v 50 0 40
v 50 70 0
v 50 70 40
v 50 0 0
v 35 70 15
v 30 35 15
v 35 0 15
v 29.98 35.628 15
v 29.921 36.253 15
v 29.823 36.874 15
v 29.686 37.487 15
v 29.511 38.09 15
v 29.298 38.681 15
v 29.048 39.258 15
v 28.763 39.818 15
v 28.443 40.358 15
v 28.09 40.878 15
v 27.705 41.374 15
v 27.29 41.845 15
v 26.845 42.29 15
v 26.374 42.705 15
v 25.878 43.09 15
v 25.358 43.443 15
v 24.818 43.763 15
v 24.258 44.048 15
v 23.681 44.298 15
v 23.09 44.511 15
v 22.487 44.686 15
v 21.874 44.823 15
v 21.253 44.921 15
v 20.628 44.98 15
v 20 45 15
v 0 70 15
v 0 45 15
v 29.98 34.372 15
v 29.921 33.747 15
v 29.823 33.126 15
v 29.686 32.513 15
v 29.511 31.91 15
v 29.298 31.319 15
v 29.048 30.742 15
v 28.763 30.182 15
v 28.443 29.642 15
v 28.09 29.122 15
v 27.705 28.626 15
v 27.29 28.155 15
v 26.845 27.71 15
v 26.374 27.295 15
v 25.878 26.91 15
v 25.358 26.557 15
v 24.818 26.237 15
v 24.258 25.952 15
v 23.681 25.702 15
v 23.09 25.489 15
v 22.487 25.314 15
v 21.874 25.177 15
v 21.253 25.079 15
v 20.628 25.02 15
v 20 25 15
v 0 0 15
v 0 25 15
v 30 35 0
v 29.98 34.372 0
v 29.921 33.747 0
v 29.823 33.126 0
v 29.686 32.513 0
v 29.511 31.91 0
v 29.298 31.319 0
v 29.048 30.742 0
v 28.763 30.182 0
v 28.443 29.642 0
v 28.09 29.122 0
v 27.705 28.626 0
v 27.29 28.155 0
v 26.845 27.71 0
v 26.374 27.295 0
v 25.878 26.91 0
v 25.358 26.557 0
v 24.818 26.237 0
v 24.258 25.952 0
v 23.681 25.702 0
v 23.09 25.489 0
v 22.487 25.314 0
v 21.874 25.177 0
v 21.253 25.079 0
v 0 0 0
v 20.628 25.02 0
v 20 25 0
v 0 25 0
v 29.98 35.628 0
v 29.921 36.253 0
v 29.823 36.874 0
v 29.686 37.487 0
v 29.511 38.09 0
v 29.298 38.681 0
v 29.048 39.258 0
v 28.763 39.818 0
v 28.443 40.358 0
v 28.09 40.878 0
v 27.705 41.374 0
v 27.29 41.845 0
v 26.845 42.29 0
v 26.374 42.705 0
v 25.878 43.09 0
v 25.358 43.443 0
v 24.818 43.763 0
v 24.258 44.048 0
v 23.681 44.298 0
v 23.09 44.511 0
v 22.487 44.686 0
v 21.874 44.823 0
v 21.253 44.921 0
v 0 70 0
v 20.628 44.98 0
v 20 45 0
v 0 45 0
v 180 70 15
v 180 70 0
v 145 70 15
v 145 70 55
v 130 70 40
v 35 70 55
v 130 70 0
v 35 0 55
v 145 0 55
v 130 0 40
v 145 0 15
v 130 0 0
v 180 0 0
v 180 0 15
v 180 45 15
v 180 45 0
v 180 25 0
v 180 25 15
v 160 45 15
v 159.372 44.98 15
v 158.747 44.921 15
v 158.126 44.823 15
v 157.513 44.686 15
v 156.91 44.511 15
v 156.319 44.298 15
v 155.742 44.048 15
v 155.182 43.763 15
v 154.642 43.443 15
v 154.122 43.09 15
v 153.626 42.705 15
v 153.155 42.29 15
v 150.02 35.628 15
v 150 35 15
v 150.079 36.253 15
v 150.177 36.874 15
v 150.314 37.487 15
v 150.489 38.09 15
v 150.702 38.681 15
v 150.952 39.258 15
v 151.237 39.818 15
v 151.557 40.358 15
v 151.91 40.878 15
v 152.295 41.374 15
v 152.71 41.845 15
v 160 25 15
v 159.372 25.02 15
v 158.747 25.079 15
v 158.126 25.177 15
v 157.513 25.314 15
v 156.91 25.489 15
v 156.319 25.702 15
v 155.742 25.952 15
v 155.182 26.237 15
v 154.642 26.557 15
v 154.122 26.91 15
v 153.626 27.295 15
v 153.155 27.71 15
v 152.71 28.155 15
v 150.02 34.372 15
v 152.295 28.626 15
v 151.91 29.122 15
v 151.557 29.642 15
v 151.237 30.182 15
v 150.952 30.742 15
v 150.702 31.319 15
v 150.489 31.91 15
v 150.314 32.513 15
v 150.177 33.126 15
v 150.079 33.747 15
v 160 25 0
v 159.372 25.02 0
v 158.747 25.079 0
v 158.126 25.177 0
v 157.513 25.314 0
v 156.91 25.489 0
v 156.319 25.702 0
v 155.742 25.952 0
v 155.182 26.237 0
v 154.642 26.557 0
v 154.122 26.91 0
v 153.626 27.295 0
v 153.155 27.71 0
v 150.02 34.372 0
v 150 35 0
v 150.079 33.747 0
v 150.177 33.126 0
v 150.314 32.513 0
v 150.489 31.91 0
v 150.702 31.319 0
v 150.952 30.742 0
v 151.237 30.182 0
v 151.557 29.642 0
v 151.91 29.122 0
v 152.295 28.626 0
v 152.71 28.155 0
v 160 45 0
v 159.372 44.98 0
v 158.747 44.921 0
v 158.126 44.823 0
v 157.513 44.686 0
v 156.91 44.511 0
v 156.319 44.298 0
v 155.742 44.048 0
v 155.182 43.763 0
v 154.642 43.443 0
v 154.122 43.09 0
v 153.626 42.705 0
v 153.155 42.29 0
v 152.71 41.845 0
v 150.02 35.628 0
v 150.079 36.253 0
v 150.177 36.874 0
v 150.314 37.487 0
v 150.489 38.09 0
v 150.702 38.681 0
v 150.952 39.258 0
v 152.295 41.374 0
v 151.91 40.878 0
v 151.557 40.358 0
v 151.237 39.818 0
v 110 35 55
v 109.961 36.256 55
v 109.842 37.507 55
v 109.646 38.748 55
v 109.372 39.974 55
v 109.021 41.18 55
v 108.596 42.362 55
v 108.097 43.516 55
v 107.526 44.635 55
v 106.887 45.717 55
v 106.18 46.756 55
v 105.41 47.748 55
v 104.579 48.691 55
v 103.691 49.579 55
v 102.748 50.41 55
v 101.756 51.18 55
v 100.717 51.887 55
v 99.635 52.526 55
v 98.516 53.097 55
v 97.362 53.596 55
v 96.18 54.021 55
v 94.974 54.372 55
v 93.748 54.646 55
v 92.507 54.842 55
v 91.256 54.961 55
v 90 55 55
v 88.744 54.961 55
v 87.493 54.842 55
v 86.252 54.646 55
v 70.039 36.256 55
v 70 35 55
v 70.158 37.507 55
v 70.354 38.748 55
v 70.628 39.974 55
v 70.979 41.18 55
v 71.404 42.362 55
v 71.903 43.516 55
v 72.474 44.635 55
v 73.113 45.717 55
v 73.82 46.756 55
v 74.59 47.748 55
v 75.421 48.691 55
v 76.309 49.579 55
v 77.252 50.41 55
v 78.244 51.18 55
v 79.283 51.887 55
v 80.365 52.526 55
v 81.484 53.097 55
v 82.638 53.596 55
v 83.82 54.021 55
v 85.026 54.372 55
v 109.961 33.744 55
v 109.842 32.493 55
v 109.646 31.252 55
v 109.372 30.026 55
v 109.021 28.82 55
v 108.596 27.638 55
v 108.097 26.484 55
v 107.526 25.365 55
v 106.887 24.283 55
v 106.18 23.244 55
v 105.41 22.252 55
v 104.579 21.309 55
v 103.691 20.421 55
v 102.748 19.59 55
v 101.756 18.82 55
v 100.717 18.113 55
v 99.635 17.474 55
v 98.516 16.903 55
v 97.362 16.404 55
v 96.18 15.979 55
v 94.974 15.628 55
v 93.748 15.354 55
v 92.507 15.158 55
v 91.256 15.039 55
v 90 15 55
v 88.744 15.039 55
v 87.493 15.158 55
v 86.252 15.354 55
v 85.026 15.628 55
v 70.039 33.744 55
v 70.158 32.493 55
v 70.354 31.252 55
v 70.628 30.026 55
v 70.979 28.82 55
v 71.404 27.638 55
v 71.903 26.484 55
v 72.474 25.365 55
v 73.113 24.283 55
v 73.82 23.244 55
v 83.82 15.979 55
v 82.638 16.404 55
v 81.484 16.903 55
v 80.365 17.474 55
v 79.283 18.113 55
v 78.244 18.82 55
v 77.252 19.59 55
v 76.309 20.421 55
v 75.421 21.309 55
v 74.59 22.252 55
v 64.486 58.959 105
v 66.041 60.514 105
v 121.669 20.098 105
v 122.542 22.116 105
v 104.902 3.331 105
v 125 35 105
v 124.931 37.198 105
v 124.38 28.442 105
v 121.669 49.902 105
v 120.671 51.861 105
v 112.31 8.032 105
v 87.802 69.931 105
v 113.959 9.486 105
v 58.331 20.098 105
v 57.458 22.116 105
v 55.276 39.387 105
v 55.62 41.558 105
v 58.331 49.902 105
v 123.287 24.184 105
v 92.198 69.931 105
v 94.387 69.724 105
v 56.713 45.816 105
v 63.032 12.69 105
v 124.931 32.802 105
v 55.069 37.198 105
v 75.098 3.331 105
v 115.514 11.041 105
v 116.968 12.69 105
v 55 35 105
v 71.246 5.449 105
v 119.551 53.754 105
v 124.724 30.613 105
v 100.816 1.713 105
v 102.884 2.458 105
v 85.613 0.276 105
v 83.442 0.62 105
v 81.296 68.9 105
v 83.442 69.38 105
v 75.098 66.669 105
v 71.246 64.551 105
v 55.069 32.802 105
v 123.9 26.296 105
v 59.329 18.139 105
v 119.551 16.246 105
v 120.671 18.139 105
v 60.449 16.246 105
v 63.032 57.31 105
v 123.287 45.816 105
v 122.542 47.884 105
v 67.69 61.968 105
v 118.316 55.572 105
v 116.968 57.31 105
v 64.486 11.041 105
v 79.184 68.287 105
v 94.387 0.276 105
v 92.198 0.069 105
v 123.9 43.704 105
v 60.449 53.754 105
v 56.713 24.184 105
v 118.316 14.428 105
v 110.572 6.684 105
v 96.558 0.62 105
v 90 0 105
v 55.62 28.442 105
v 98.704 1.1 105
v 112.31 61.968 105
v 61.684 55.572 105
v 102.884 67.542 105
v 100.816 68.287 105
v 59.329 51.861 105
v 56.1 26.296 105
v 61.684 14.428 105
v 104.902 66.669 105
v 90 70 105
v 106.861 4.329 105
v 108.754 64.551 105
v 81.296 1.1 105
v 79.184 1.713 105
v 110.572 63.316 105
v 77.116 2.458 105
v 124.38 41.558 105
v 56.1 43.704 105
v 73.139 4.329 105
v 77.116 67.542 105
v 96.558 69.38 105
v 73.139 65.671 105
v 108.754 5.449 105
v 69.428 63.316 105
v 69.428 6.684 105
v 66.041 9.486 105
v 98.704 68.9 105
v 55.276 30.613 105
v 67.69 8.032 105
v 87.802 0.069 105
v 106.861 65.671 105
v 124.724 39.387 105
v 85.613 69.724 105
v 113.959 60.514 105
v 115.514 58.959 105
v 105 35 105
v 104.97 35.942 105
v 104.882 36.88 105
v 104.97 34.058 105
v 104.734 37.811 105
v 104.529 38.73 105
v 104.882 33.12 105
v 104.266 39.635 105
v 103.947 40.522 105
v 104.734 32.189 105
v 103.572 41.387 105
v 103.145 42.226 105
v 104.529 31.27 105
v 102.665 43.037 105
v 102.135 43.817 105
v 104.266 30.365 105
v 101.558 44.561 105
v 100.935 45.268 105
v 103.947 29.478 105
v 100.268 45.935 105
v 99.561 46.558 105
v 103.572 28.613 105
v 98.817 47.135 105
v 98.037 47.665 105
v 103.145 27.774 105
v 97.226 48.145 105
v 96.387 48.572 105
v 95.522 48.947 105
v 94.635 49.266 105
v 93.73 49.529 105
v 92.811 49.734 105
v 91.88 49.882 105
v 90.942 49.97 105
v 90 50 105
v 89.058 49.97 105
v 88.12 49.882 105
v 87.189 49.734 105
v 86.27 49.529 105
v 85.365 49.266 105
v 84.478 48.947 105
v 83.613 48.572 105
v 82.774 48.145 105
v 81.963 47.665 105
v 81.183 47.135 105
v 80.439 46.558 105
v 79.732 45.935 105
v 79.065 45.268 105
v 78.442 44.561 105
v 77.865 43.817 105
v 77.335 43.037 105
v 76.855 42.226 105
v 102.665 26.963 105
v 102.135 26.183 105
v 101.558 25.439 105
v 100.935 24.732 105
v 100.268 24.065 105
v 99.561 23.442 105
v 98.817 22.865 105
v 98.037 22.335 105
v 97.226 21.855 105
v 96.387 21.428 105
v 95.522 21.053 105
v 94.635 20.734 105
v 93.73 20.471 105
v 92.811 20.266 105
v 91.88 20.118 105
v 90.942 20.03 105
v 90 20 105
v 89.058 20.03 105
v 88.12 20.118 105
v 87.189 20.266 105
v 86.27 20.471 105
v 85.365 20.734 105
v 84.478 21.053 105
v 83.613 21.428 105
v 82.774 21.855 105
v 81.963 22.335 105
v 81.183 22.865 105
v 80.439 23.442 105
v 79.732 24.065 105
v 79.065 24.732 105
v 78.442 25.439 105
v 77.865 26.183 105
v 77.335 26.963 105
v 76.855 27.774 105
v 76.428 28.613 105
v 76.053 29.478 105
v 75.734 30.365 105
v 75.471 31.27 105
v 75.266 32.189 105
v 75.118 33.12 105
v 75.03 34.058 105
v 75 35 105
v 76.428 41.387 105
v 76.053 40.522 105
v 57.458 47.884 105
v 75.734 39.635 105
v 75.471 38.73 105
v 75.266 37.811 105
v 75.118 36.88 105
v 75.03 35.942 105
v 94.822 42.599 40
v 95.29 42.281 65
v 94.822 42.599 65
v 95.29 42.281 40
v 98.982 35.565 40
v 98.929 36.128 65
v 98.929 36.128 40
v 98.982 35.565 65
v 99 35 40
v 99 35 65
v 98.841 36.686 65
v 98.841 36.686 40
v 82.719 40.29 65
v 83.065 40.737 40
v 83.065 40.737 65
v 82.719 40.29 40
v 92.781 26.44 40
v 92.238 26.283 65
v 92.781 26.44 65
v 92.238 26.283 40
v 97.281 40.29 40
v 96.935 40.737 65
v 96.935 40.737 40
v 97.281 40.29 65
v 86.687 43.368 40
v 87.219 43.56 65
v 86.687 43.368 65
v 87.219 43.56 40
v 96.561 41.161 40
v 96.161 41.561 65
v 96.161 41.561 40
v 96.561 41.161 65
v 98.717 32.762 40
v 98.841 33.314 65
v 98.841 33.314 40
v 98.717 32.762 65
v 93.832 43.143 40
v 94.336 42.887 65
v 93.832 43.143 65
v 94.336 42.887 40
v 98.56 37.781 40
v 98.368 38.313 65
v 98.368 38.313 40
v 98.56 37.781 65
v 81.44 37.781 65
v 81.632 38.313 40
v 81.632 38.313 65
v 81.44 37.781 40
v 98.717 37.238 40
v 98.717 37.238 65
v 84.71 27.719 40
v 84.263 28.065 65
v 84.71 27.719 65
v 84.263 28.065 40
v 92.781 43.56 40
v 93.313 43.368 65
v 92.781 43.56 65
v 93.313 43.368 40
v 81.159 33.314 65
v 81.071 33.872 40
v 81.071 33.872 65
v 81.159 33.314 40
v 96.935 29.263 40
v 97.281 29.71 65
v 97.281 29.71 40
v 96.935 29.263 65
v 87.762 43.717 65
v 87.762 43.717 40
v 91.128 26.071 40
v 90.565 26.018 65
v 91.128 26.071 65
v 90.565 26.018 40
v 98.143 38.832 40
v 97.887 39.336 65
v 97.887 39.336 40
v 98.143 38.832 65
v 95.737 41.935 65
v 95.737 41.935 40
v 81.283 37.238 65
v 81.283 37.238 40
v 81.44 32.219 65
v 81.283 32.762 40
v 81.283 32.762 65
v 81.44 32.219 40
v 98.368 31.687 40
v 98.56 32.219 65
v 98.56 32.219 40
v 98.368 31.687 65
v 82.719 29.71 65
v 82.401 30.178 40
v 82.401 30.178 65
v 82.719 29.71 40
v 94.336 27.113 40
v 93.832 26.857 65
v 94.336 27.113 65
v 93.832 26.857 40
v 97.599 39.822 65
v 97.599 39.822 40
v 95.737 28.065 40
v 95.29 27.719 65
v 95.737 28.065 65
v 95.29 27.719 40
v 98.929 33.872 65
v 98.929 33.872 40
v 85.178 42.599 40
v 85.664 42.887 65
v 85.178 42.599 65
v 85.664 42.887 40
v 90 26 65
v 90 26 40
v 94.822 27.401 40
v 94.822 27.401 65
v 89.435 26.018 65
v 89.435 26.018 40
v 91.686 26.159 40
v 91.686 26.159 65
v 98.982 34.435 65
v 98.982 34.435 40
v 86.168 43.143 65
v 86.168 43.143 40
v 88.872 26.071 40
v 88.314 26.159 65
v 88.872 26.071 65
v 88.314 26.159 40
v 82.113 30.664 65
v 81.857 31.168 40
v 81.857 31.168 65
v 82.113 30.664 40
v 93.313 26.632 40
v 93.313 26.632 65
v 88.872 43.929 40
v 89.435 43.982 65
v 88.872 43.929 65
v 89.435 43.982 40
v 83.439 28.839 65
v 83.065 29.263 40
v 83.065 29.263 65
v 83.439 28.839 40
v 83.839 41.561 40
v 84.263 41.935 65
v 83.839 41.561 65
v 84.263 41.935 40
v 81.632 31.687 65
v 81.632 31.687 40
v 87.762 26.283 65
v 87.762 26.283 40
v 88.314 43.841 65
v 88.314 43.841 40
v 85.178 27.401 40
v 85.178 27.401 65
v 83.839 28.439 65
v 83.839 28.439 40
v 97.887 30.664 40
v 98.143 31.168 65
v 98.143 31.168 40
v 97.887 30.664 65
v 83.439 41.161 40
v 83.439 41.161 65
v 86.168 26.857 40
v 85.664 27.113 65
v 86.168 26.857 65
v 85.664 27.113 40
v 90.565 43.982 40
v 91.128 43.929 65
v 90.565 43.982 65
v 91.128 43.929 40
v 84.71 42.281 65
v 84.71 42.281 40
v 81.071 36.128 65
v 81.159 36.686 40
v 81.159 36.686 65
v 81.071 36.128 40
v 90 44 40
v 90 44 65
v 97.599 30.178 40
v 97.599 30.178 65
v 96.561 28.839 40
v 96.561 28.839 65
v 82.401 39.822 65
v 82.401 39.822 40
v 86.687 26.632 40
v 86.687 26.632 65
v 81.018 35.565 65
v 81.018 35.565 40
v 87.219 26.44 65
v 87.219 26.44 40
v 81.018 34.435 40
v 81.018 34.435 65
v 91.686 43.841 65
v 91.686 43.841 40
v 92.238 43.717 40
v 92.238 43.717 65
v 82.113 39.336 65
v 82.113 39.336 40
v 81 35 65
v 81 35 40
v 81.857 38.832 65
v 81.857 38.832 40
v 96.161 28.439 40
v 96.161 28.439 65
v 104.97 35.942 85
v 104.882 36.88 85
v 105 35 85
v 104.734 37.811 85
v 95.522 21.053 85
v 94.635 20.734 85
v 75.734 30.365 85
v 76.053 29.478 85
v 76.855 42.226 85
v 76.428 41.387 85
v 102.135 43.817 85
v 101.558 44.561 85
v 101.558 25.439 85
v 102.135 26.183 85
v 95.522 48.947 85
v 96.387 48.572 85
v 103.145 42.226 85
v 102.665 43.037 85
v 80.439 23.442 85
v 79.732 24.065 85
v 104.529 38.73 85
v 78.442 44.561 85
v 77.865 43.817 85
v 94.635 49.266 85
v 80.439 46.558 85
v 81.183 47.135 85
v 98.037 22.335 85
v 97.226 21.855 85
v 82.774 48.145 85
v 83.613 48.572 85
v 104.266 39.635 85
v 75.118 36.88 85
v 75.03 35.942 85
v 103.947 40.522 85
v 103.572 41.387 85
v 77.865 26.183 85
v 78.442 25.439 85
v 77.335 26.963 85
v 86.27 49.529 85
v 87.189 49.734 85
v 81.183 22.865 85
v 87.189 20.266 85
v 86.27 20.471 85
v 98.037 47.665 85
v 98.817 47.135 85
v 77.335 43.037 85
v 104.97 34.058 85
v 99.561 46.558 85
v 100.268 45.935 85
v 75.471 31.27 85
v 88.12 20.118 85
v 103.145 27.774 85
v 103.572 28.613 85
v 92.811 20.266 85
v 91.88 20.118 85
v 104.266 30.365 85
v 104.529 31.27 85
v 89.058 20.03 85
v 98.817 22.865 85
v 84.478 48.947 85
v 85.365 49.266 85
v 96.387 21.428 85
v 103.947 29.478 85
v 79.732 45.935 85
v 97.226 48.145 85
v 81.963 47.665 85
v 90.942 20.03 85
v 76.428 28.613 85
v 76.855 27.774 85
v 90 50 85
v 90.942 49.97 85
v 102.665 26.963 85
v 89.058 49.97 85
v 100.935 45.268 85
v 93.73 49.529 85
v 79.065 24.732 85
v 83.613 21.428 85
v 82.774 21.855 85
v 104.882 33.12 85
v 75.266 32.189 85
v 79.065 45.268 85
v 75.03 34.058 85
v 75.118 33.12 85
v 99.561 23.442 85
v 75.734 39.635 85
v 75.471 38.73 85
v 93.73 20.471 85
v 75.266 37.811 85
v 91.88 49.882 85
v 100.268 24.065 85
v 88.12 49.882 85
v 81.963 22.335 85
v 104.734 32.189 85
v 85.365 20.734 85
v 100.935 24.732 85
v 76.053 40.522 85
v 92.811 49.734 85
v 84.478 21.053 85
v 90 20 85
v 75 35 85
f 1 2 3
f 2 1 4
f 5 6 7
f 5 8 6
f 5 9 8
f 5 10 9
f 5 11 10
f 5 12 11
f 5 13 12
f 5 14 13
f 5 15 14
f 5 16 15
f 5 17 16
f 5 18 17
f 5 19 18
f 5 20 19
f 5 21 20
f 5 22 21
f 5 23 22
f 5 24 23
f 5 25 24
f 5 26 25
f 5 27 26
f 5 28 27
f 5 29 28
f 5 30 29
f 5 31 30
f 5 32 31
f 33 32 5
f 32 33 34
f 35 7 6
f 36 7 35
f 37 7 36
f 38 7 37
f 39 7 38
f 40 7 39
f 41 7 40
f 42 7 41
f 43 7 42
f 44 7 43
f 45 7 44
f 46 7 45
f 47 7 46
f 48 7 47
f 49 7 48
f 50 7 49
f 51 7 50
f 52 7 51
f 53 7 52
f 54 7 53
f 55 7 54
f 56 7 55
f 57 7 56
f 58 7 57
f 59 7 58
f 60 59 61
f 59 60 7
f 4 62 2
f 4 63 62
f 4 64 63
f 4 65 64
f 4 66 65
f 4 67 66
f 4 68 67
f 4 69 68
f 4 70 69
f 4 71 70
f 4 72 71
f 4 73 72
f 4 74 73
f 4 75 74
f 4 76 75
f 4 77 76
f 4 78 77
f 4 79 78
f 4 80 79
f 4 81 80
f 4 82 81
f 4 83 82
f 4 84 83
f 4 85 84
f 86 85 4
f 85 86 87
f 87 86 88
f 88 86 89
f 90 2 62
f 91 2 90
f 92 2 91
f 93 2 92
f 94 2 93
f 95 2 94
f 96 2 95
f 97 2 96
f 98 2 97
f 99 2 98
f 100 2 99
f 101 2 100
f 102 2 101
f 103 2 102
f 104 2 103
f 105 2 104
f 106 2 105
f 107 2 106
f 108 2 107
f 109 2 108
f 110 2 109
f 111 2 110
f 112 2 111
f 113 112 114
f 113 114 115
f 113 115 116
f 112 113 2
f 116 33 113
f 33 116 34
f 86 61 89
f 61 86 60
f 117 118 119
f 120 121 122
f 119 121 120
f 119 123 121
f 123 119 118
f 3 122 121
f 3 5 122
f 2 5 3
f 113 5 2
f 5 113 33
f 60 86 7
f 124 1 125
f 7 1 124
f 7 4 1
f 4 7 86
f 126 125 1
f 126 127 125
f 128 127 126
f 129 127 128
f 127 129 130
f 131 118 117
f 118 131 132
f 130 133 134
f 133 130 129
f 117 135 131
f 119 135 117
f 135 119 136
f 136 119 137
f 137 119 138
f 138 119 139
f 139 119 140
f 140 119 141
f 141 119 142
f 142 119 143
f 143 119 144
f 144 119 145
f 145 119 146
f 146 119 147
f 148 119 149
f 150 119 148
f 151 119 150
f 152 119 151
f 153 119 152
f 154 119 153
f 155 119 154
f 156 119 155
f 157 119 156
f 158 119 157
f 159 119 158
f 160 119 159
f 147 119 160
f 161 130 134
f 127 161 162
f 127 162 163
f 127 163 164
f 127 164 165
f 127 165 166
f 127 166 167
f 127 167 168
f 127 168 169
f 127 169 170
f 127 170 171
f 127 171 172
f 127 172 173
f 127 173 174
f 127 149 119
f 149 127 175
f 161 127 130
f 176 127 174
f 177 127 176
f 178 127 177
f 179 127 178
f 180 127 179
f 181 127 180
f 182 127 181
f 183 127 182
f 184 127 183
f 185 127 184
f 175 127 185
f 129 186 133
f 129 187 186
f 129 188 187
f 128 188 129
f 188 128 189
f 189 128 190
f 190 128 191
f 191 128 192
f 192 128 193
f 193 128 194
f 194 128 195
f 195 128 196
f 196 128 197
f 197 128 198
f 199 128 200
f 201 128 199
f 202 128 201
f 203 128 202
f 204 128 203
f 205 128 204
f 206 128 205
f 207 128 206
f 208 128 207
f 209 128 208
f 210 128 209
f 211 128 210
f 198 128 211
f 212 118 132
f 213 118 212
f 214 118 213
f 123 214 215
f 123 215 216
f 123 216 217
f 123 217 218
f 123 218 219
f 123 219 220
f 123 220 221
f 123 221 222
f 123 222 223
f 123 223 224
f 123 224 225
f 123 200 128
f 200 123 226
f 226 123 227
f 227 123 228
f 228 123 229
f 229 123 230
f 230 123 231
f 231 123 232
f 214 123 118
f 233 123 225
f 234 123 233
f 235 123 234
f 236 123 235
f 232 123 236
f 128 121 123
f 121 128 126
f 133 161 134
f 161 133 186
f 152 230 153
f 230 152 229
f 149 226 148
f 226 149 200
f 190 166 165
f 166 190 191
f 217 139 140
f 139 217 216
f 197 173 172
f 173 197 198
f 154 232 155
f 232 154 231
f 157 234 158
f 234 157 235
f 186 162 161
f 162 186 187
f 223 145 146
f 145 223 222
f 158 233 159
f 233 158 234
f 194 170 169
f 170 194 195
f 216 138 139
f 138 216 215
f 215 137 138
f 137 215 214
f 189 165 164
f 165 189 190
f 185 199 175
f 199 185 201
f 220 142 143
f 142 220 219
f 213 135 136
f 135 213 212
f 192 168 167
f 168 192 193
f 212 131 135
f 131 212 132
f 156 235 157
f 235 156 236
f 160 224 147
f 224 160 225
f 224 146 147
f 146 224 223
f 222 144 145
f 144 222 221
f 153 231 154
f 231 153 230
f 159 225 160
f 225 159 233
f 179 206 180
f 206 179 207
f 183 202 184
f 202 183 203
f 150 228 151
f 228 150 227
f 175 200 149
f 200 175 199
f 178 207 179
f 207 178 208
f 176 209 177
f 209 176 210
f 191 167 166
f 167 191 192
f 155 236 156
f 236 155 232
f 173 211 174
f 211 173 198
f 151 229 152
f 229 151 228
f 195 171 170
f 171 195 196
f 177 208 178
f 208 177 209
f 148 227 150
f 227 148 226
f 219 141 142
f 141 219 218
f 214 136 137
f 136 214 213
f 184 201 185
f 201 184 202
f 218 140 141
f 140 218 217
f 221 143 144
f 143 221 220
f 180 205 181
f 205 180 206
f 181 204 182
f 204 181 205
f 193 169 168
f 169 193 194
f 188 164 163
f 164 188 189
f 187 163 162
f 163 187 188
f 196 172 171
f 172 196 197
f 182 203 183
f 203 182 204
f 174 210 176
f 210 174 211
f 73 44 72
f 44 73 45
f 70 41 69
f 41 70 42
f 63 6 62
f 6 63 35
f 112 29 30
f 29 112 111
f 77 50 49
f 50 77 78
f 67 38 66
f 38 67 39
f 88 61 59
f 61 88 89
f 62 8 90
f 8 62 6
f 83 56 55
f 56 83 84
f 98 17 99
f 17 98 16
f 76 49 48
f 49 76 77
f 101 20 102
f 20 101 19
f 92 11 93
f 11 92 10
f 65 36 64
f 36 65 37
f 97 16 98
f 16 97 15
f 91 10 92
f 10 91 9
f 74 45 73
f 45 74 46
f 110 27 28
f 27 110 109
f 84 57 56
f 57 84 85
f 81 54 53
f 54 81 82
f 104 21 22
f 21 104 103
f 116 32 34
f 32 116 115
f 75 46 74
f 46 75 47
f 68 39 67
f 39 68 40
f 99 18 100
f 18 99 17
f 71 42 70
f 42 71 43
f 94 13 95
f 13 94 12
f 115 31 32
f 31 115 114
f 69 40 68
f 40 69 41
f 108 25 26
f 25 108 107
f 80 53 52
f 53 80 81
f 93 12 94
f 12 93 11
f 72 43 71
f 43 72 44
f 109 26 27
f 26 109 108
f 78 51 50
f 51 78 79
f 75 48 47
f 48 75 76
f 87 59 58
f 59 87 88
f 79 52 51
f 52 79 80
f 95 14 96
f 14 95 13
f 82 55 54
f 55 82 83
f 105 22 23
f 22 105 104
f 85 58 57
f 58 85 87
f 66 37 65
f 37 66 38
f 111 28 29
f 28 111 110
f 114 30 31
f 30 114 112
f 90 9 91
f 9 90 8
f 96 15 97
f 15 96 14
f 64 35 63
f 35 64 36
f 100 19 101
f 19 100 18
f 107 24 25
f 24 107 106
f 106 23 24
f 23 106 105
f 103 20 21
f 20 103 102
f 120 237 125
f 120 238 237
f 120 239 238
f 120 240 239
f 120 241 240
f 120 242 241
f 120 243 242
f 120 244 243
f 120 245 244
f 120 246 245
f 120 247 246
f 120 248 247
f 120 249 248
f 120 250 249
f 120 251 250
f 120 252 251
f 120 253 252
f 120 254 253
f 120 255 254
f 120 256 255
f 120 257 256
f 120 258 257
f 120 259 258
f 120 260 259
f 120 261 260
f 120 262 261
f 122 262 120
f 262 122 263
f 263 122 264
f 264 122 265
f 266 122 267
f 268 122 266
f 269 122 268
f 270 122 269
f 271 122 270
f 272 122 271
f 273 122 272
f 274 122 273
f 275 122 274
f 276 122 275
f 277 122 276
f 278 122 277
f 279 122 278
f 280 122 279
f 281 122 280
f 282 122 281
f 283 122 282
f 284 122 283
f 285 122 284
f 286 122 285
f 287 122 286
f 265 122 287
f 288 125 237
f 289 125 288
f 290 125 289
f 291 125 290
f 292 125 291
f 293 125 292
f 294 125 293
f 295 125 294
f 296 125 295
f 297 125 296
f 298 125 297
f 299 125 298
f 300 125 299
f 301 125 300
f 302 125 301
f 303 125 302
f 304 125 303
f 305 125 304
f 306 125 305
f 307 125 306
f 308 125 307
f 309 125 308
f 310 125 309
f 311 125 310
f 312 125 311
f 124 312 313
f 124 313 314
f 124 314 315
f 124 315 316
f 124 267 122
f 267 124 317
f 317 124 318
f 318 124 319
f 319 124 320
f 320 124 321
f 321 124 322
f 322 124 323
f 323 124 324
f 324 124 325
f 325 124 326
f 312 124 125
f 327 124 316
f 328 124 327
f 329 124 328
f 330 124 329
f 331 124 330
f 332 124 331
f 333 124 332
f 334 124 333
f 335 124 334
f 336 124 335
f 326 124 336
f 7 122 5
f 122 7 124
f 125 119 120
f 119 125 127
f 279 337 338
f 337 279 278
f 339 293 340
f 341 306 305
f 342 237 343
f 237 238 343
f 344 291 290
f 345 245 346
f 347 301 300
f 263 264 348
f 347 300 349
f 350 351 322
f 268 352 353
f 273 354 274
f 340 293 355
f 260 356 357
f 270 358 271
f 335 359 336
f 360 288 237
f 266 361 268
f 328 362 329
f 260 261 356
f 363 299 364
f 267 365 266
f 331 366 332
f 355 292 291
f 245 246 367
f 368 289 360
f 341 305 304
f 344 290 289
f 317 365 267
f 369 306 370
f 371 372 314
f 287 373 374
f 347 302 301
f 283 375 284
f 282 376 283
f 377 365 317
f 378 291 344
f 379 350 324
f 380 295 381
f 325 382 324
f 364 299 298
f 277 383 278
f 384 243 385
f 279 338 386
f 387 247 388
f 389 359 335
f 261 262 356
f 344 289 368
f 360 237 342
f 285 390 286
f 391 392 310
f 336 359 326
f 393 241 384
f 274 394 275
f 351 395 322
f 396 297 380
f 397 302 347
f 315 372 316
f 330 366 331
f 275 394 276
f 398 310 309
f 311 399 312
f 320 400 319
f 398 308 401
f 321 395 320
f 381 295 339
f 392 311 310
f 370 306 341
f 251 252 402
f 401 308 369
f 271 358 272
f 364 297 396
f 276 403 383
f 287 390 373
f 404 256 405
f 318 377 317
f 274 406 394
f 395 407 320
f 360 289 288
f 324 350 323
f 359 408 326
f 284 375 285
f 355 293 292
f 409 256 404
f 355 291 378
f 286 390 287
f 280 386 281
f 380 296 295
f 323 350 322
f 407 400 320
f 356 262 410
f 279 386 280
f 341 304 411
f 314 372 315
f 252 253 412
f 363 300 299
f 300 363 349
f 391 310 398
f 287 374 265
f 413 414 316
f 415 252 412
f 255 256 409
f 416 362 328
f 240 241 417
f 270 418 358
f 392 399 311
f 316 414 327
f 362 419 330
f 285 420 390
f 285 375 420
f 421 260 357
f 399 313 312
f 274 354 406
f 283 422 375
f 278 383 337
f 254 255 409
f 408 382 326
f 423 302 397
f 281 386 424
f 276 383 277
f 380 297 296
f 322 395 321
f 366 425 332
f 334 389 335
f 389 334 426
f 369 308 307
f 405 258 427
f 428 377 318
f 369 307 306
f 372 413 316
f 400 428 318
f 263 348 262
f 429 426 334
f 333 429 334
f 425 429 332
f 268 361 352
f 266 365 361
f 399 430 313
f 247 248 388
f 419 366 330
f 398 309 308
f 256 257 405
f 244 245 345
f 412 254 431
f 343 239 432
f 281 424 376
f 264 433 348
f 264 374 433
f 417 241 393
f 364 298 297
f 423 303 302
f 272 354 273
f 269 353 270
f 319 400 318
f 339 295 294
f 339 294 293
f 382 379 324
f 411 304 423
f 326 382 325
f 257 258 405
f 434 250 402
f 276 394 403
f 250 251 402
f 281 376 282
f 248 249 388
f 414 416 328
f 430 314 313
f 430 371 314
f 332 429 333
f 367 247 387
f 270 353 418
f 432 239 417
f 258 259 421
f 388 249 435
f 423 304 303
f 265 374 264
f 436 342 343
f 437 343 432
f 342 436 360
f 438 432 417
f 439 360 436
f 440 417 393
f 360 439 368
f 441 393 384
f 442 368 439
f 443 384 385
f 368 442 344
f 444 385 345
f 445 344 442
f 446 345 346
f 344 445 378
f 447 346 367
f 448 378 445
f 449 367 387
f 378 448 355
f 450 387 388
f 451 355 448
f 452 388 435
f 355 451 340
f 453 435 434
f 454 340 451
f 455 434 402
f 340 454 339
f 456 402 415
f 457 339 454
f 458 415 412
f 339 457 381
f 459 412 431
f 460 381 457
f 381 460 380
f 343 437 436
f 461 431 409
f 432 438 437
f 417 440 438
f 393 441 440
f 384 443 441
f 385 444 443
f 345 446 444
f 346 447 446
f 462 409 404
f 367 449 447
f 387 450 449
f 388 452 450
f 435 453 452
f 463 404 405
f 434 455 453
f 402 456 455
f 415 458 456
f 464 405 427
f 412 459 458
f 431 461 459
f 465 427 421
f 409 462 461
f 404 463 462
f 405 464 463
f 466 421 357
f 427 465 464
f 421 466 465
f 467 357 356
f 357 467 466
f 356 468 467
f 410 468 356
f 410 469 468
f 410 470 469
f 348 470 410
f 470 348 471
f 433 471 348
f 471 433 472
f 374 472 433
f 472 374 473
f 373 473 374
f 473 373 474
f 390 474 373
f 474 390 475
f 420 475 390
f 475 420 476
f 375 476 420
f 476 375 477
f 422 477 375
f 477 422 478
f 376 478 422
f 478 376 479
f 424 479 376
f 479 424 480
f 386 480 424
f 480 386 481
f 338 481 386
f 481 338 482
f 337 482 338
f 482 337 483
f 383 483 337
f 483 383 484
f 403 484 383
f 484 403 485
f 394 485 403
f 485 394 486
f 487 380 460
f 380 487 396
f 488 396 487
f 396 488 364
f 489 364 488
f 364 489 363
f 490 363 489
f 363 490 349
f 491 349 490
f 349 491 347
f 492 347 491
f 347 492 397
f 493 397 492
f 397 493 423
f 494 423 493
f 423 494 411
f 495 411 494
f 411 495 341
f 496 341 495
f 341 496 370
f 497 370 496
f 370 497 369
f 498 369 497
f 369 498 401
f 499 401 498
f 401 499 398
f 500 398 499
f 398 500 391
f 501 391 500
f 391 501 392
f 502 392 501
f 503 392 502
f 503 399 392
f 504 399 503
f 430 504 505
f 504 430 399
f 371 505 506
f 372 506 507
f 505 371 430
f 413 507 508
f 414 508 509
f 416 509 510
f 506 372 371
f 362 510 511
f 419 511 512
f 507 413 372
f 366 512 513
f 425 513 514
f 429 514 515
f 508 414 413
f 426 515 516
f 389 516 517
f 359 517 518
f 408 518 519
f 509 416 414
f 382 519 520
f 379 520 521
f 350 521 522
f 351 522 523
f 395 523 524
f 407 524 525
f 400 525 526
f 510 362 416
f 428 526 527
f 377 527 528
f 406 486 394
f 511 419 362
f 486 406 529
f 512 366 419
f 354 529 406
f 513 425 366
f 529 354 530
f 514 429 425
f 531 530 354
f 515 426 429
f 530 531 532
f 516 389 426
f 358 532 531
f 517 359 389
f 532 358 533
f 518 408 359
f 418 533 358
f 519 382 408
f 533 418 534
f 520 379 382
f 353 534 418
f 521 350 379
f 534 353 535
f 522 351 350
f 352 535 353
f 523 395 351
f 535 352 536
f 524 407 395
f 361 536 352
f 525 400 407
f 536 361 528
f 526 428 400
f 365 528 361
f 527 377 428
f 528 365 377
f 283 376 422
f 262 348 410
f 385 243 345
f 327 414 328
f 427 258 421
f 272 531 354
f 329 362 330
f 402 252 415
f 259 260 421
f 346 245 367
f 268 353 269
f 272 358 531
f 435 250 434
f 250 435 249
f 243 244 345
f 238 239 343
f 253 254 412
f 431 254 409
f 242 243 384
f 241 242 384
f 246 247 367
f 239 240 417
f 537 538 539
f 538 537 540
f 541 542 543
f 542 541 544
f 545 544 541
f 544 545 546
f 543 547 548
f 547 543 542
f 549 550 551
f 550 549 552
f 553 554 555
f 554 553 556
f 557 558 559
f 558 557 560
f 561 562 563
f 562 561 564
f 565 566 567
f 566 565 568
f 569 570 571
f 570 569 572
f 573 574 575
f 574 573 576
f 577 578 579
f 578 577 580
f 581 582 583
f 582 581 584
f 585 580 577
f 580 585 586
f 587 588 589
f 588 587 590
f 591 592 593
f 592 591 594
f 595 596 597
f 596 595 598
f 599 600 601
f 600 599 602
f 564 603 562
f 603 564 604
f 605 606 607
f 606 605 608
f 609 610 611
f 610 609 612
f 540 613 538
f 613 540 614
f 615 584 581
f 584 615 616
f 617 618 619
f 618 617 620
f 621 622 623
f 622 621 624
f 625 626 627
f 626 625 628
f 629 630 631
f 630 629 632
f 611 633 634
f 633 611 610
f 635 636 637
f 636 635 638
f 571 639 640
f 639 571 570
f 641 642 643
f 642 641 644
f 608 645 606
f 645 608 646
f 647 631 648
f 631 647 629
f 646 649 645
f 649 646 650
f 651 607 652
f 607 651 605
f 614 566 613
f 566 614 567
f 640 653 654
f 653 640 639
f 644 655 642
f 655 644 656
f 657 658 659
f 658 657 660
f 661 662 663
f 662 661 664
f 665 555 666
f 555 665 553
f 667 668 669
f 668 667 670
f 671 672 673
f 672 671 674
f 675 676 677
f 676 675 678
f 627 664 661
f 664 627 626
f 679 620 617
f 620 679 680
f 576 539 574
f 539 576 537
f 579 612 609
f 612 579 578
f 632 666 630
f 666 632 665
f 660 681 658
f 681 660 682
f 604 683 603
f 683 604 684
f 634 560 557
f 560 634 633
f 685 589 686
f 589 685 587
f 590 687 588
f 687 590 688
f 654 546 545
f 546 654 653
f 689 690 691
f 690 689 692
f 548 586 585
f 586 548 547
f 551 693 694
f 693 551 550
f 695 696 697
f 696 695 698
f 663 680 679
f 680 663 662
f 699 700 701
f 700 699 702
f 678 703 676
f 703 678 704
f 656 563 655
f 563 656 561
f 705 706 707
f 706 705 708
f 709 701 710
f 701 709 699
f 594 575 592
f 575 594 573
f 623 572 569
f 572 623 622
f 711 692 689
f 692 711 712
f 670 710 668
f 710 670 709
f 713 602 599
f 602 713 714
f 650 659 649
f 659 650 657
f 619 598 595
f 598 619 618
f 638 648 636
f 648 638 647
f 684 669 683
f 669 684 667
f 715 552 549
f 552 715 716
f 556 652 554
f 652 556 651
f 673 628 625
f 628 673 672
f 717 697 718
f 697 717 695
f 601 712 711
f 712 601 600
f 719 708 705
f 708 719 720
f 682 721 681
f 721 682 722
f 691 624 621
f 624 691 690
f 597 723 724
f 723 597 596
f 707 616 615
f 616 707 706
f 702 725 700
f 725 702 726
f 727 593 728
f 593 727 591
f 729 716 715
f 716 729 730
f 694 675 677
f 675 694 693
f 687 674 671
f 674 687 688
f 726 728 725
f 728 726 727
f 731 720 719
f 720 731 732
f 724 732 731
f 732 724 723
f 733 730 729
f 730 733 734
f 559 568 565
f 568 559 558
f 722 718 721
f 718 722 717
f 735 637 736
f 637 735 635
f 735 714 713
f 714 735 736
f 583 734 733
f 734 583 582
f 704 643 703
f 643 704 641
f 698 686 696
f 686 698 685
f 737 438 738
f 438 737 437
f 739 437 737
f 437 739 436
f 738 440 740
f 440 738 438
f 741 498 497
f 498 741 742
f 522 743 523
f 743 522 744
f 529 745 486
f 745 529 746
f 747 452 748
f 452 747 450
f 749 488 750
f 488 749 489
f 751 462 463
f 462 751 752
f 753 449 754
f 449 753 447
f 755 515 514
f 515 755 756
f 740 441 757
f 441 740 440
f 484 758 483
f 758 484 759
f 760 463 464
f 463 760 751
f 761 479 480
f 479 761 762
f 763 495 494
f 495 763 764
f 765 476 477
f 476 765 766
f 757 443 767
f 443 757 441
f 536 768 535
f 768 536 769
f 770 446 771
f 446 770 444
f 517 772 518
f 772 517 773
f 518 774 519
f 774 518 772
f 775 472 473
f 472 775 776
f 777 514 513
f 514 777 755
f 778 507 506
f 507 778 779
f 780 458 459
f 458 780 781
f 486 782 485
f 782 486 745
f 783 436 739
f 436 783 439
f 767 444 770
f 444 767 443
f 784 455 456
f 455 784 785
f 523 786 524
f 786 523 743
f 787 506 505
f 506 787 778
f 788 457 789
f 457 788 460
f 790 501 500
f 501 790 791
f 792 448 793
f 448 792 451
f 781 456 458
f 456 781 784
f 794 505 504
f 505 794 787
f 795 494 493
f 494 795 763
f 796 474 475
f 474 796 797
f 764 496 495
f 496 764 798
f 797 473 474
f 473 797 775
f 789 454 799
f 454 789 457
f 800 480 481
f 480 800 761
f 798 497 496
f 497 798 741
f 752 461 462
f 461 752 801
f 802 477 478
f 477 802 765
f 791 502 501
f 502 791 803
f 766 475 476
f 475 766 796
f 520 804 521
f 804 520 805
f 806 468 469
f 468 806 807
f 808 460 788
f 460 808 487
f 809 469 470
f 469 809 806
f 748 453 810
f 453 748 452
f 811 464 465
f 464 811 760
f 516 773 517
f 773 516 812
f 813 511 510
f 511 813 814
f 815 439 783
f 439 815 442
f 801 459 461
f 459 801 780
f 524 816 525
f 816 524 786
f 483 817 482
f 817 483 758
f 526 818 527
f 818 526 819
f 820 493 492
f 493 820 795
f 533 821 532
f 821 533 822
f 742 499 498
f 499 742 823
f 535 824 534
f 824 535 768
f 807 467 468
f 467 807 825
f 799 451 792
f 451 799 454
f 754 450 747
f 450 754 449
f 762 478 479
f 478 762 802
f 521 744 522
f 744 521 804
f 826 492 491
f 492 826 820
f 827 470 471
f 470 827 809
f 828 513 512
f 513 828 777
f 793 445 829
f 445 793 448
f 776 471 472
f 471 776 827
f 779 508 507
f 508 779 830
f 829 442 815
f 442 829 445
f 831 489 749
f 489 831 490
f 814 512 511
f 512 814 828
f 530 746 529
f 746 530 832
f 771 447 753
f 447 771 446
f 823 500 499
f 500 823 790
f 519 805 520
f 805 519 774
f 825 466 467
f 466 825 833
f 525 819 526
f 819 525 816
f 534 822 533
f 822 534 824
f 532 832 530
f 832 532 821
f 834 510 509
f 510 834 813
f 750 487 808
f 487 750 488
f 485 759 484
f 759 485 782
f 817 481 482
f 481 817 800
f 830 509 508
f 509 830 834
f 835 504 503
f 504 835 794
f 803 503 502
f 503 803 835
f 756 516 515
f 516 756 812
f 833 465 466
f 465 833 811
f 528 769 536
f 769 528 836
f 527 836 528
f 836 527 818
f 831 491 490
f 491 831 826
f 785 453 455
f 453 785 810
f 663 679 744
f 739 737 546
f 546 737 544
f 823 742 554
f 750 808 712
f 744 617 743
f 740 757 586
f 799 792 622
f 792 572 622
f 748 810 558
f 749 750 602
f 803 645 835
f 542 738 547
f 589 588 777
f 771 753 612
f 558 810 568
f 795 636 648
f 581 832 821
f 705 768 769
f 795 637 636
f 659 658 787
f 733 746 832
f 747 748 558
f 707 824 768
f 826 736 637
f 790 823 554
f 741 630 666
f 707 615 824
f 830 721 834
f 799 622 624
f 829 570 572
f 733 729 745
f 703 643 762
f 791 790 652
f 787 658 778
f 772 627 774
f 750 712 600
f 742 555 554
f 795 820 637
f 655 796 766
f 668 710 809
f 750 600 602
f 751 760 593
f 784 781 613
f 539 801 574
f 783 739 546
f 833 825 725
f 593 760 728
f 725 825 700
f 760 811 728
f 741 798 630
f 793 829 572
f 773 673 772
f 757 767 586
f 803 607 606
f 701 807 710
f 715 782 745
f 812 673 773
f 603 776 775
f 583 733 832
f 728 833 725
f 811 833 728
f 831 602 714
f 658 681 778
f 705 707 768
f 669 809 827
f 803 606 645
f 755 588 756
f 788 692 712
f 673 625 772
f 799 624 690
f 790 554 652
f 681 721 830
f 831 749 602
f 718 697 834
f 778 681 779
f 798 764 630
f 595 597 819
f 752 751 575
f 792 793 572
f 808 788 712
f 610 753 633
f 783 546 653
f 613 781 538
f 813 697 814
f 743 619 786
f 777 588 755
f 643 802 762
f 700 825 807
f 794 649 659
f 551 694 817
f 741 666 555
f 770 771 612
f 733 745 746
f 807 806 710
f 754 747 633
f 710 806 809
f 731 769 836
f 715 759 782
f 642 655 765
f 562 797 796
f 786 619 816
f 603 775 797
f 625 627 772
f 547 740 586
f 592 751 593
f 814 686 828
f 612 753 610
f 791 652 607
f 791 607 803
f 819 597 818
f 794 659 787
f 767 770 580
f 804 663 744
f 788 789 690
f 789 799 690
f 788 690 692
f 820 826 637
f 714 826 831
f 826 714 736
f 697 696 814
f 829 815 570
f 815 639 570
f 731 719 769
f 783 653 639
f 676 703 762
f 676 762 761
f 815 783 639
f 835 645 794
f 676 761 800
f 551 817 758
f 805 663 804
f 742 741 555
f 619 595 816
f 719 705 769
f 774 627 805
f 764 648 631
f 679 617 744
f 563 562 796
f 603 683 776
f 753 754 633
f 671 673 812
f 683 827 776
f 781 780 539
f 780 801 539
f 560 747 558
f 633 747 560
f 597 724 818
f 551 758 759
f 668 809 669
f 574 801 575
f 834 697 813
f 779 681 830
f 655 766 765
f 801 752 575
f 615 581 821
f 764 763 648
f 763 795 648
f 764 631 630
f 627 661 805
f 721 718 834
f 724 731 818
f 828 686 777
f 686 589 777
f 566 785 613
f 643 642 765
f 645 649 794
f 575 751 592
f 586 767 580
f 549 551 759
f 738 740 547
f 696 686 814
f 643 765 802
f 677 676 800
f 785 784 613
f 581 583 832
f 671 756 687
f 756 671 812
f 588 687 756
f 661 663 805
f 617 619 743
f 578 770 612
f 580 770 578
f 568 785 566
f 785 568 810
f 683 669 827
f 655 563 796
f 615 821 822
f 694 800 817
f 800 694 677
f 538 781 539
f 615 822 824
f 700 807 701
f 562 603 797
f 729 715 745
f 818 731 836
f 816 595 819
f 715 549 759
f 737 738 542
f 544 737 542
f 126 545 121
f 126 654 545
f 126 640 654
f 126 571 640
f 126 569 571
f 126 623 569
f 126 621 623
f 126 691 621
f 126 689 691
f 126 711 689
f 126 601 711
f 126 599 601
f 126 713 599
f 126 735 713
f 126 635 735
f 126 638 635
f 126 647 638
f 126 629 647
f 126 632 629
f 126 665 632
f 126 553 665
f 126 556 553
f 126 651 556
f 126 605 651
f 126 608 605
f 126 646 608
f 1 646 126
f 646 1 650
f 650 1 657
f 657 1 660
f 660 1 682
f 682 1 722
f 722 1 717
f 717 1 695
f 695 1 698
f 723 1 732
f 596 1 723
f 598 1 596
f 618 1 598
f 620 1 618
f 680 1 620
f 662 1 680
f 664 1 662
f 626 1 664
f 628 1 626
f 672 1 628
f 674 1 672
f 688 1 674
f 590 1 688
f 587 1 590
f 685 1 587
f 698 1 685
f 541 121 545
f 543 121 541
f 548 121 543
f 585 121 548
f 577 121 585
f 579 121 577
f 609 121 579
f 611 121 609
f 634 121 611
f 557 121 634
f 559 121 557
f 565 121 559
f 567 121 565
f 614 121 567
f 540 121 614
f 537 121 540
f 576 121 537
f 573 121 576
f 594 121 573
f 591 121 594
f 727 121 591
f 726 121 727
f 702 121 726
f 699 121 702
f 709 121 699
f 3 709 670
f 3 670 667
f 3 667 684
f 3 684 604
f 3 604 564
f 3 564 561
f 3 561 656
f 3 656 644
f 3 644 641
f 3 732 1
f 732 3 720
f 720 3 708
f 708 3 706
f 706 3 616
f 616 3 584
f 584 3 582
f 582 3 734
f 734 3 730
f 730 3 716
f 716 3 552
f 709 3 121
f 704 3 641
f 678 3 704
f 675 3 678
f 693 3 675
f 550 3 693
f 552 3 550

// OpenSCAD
// file: library.scad
//READ ME
/* List of things to add 
1. annulus flat tube
*/


// bug finder
//assert(TranslatX!=undef, "X translation is required");

//Module list
//orbital_cylinders(ObitalDistance ,NumberOfCylinders , cylinderRadius, cylinderHeight);
//anulus(outerRadius, innerRadius, cylinderHeight);
//anulus_cube(outerX, outerY, innerX, innerY, HeightZ);
//cube_cut(DepthX, WidthY, HeightZ, TranslateX, TranslateY, TranslateZ);
//cylinder_cut(cylHeight, cylRadius, TranslateX, TranslateY, TranslateZ, rotateX, rotateY, rotateZ);
//rounded_corner(circleRadius,Thickness);
//triangle(Height, length, Depth);



//------------------------------------------------------------------------------------------------------------------------
module orbital_cylinders(ObitalDistance ,NumberOfCylinders , cylinderRadius, cylinderHeight){
    // Will generate a set of orbiting cylinders base on the values you give it.
    for (Holes = [0:360/NumberOfCylinders:360] ){
        rotate([0, 0, Holes])
        translate([ObitalDistance, 0, 0])
        cylinder(cylinderHeight, r = cylinderRadius);
        }// hehe cuts circles in a circle
        
        // Starting with the DISTANCE from the X ORIGIN to the X EDGE of the circle .ie (Radius)
}       // The obiting cylinders will be evenly spaced starting on the X line.
        // To finish the orbiting cylinders will also be defined in RADIUS,
        // just acted like they're normal cylinders they don't like being called clones.
//------------------------------------------------------------------------------------------------------------------------
module anulus(outerRadius, innerRadius, cylinderHeight){
    difference(){
        cylinder(cylinderHeight, r = outerRadius);
        cylinder(cylinderHeight, r = innerRadius);
        
        }
    }
//------------------------------------------------------------------------------------------------------------------------
module anulus_cube(outerX, outerY, innerX, innerY, HeightZ){
    difference(){
        cube([ outerX, outerY, HeightZ], true);
        cube([ innerX, innerY, HeightZ],true);
        }
    }
//------------------------------------------------------------------------------------------------------------------------
module cube_cut( DepthX, WidthY, HeightZ, TranslateX, TranslateY, TranslateZ ){
    translate([ TranslateX, TranslateY, TranslateZ])
        cube([ DepthX, WidthY, HeightZ]);
    }
//------------------------------------------------------------------------------------------------------------------------
module cylinder_cut(cylHeight, cylRadius, TranslateX, TranslateY, TranslateZ, rotateX, rotateY, rotateZ){
translate([TranslateX, TranslateY, TranslateZ])
    rotate([rotateX, rotateY, rotateZ])
        cylinder(cylHeight, r = cylRadius);
    assert(TranslateY!=undef, "X translation is required"); 
}
//------------------------------------------------------------------------------------------------------------------------
module rounded_corner(circleRadius,Thickness){// Rounds a corner on a cube.
    difference(){
        translate([ -circleRadius, -circleRadius, 0])
            cube([circleRadius * 2, circleRadius * 2, Thickness]); 

        translate([ -circleRadius, -circleRadius * 2, 0])
            cube([circleRadius * 2, circleRadius * 2, Thickness]);

        translate([ -circleRadius * 2, 0, 0])
            cube([circleRadius * 2, circleRadius * 2, Thickness]);

            cylinder(Thickness,r = circleRadius, true);
    }  
    }
//------------------------------------------------------------------------------------------------------------------------
module triangle(Length, Height, Depth){
    linear_extrude(Depth){
        polygon( points = [[0, 0],[Height, 0],[0, Length],[0, 0]]);
    }
        }
    
    
    
    
    
    
    
    
    
    
    
// main file
$fn = 100;
mm = 1;
degree = 1;
diameter = .5;
use <library.scad>

render(){
bent_Base();
}

module bent_Base(){
    Z_Zero_Plates();
    Leg();
    Top_Plate();
    
    baseThickness = 15;
    footDepth = 50;
    footWidth = 70;
    footDifference = 80;
    LegHeight = 55;
    overAllLength =(footDepth * 2) + footDifference ;
    
    module Z_Zero_Plates(){
        mountingCutRadius = 10;
        mountingCutOffset = 20;
        difference(){
            union(){
                cube([footDepth, footWidth, baseThickness]);
                
                translate([footDepth + footDifference, 0, 0])
                    cube([footDepth, footWidth, baseThickness]);
            }

        translate([overAllLength - mountingCutOffset, 0, 0 ])
            hull(){
                translate([mountingCutOffset, footWidth / 2, 0])
                    cylinder(baseThickness, r = mountingCutRadius );
                
                translate([0, footWidth / 2, 0])
                    cylinder(baseThickness, r = mountingCutRadius );
                    
                }
            
            hull(){
                translate([mountingCutOffset, footWidth / 2, 0])
                    cylinder(baseThickness, r = mountingCutRadius );
                
                translate([0, footWidth / 2, 0])
                    cylinder(baseThickness, r = mountingCutRadius );
                    
                }
            
        }
    }
        
    module Leg(){
        
        
        translate([ (footDepth - baseThickness), 0, 0])
            cube([baseThickness, footWidth, LegHeight]);
        
        translate([ footDepth + footDifference, 0, 0])
            cube([baseThickness, footWidth, LegHeight]);
        }
        
    module Top_Plate(){
        Top_Cylinder();
        topPlateLength = 80;
        topDiameter = 70 * diameter;
        bottumDiameter = 40 * diameter;
        cylinderHeight = 50;
        centerCylinderCutDiameter = 18 * diameter;
        
        difference(){
            translate([ footDepth, 0, LegHeight - baseThickness])
                cube([topPlateLength, footWidth, baseThickness]);
                
            translate([((footDepth * 2) + topPlateLength) /2, footWidth / 2, 0])
                cylinder((cylinderHeight + LegHeight), r = centerCylinderCutDiameter);
        }

        module Top_Cylinder(){
            firstBoreCutDiameter = 30 * diameter ;
            BoreCylinderHeight = 20;
            
            difference(){
                translate([((footDepth * 2) + topPlateLength) /2, footWidth / 2, LegHeight])
                    cylinder(cylinderHeight, bottumDiameter, topDiameter);
                
                translate([((footDepth * 2) + topPlateLength) /2, footWidth / 2, LegHeight])
                    cylinder((cylinderHeight + LegHeight), r = centerCylinderCutDiameter);
                
                translate([((footDepth * 2) + topPlateLength) /2, footWidth / 2, (LegHeight + cylinderHeight) - BoreCylinderHeight])
                    cylinder(BoreCylinderHeight, r = firstBoreCutDiameter);
                
                translate([((footDepth * 2) + topPlateLength) /2, footWidth / 2, (LegHeight + cylinderHeight) - (BoreCylinderHeight * 2)])
                    cylinder(BoreCylinderHeight, centerCylinderCutDiameter, firstBoreCutDiameter);
                
                }
                
                
                }
        }
        
    



    }
    
    
    
    
    
    
    
    
    
    
    
    
    
